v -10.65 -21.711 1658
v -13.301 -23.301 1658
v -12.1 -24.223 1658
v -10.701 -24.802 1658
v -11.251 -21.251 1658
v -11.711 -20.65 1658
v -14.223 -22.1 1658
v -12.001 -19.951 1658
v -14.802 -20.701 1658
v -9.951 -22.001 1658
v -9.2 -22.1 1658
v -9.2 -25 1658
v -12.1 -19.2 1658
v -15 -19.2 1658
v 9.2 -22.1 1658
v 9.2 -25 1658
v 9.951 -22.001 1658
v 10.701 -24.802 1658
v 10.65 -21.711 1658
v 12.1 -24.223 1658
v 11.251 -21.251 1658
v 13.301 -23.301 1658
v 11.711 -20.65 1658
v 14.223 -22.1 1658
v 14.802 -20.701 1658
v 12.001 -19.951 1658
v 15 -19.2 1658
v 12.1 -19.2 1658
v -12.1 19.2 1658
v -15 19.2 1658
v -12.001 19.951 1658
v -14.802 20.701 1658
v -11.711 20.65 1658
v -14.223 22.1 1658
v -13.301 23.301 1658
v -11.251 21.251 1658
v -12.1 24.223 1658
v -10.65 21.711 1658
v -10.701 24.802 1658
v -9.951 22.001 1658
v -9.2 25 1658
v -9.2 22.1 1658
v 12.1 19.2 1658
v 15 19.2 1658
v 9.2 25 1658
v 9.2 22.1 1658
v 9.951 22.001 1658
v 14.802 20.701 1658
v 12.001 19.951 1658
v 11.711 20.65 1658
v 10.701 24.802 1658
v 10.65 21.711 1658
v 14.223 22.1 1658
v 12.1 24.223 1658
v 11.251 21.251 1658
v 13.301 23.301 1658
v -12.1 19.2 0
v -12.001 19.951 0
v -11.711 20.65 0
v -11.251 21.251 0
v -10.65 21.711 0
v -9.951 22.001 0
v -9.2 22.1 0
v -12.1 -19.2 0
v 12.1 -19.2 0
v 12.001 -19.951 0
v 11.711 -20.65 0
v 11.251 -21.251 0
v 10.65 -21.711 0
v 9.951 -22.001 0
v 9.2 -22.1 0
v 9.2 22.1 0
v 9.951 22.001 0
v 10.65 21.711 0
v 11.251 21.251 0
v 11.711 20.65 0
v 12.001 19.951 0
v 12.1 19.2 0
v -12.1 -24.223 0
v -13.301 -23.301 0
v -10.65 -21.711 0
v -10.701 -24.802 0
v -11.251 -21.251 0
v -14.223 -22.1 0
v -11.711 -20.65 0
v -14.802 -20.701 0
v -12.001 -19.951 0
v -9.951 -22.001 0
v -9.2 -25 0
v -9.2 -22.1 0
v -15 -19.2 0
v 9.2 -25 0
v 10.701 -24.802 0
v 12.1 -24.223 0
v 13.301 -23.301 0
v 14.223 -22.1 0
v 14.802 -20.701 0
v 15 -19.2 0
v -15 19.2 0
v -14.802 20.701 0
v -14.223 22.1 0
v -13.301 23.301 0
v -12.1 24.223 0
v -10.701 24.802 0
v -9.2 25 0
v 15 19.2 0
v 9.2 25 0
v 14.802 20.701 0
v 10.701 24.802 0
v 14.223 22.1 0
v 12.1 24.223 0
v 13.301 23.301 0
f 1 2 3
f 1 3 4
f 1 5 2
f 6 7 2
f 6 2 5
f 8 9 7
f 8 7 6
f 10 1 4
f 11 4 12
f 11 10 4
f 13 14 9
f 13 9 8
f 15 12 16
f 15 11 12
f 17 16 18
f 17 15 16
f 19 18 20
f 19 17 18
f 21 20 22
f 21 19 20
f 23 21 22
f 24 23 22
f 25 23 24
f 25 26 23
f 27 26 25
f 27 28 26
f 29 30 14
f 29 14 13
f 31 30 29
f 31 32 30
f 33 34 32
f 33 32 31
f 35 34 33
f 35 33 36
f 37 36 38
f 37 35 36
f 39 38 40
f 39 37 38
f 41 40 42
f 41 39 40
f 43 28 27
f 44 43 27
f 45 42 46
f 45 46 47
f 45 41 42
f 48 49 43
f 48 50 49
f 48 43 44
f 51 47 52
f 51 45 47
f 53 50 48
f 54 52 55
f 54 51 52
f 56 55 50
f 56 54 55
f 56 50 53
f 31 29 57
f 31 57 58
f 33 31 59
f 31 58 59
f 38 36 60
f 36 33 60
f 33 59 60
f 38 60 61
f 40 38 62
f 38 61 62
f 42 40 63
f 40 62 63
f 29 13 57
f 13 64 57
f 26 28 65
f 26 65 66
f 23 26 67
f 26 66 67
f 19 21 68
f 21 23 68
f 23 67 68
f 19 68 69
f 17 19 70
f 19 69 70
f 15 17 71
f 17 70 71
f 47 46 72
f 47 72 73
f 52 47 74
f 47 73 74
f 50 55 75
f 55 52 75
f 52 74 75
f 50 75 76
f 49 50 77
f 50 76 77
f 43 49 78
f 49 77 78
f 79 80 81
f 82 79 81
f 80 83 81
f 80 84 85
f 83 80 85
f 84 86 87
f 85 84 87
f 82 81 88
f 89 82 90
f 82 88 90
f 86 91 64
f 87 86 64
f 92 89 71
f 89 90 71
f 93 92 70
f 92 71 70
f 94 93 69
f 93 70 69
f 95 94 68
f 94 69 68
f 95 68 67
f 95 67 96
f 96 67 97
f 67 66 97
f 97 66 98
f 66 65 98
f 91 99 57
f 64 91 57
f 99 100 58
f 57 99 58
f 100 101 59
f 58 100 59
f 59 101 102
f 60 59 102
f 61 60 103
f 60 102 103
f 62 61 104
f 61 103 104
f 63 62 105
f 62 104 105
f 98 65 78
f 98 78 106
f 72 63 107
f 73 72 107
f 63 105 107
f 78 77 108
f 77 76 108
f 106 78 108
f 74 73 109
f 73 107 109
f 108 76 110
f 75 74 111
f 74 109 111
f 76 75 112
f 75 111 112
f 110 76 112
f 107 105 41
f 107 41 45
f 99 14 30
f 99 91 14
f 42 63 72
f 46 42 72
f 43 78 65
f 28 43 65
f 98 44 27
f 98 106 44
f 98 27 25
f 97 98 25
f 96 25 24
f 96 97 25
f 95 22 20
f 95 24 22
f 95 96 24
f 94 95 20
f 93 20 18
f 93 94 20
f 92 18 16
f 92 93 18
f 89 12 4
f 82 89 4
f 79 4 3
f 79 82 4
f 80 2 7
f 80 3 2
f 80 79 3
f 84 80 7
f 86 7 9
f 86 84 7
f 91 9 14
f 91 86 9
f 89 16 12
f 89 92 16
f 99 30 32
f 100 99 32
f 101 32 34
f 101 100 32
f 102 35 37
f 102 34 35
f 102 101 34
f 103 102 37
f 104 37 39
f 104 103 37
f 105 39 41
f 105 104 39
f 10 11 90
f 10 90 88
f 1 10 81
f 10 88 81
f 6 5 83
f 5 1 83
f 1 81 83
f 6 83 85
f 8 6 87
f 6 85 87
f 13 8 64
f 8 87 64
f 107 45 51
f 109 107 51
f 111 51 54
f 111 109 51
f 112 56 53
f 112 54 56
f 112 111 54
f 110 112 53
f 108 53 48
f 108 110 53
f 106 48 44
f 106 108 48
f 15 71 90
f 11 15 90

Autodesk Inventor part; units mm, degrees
ref_plane "YZ Plane" through (0, 0, 0) normal (1, 0, 0) x (0, 1, 0)
ref_plane "Start plane" through (0, 0, 0) normal (0, 0, 1) x (1, 0, 0)
ref_plane "End plane" through (0, 0, 1658) normal (0, 0, 1) x (1, 0, 0)
sketch "Sketch" plane through (0, 0, 0) normal (0, 0, 1) x (1, 0, 0)
  line L0 (-9.2, 25) -> (9.2, 25)
  line L1 (15, 19.2) -> (15, -19.2)
  line L2 (9.2, -25) -> (-9.2, -25)
  line L3 (-15, -19.2) -> (-15, 19.2)
  arc A0 (-9.2, 25) -> (-15, 19.2) centre (-9.2, 19.2) ccw
  arc A1 (15, 19.2) -> (9.2, 25) centre (9.2, 19.2) ccw
  arc A2 (9.2, -25) -> (15, -19.2) centre (9.2, -19.2) ccw
  arc A3 (-15, -19.2) -> (-9.2, -25) centre (-9.2, -19.2) ccw
  line L4 (-22.6817, 0) -> (22.6817, 0) construction
  line L5 (0, -36.6817) -> (0, 36.6817) construction
  arc A4 (-9.2, 22.1) -> (-12.1, 19.2) centre (-9.2, 19.2) ccw
  line L6 (-9.2, 22.1) -> (9.2, 22.1)
  arc A5 (12.1, 19.2) -> (9.2, 22.1) centre (9.2, 19.2) ccw
  line L7 (12.1, 19.2) -> (12.1, -19.2)
  arc A6 (9.2, -22.1) -> (12.1, -19.2) centre (9.2, -19.2) ccw
  line L8 (9.2, -22.1) -> (-9.2, -22.1)
  arc A7 (-12.1, -19.2) -> (-9.2, -22.1) centre (-9.2, -19.2) ccw
  line L9 (-12.1, -19.2) -> (-12.1, 19.2)
  point P0 (-15, 25)
  point P1 (15, -25)
  point P2 (15, 25)
  dimension "b" = 30
  dimension "ParH" = 50
  dimension "msp_r" = 5.8
  dimension "d8" = 15
  dimension "d9" = 25
  dimension "d10" = 2.9
extrude "Body" add sketch "Sketch" along normal up to surface (1658 mm away) from surface at 0
sketch "Sketch2" plane through (0, 0, 0) normal (0, 0, 1) x (1, 0, 0)
  line L0 (0, 0) -> (10, 0)
ref_plane "Work Plane3" through (0, 0, 0) normal (0, -1, 0) x (1, 0, 0)
sketch "Sketch3" plane through (0, 0, 0) normal (0, -1, 0) x (1, 0, 0)
  line L0 (-2, 0) -> (12, 0)
  line L1 (-2, 1658) -> (12, 1658)
  dimension "d14" = 1658
equation "\"msp_r\" = 2 * ParT"
equation "\"d8\" = 0.5 * b"
equation "\"d9\" = 0.5 * ParH"
equation "\"d10\" = ParT"
equation "\"G_OFFSET_START\" = 0"
equation "\"G_OFFSET_END\" = 0"
equation "\"d12\" = G_OFFSET_END + B_L"
equation "\"G_L\" = d14"
equation "\"B_L\" = 1658"
equation "\"ParT\" = 2.9"
properties part number "DIN 59 410 - 50x30x2.9-1658" material "Steel, Mild"
